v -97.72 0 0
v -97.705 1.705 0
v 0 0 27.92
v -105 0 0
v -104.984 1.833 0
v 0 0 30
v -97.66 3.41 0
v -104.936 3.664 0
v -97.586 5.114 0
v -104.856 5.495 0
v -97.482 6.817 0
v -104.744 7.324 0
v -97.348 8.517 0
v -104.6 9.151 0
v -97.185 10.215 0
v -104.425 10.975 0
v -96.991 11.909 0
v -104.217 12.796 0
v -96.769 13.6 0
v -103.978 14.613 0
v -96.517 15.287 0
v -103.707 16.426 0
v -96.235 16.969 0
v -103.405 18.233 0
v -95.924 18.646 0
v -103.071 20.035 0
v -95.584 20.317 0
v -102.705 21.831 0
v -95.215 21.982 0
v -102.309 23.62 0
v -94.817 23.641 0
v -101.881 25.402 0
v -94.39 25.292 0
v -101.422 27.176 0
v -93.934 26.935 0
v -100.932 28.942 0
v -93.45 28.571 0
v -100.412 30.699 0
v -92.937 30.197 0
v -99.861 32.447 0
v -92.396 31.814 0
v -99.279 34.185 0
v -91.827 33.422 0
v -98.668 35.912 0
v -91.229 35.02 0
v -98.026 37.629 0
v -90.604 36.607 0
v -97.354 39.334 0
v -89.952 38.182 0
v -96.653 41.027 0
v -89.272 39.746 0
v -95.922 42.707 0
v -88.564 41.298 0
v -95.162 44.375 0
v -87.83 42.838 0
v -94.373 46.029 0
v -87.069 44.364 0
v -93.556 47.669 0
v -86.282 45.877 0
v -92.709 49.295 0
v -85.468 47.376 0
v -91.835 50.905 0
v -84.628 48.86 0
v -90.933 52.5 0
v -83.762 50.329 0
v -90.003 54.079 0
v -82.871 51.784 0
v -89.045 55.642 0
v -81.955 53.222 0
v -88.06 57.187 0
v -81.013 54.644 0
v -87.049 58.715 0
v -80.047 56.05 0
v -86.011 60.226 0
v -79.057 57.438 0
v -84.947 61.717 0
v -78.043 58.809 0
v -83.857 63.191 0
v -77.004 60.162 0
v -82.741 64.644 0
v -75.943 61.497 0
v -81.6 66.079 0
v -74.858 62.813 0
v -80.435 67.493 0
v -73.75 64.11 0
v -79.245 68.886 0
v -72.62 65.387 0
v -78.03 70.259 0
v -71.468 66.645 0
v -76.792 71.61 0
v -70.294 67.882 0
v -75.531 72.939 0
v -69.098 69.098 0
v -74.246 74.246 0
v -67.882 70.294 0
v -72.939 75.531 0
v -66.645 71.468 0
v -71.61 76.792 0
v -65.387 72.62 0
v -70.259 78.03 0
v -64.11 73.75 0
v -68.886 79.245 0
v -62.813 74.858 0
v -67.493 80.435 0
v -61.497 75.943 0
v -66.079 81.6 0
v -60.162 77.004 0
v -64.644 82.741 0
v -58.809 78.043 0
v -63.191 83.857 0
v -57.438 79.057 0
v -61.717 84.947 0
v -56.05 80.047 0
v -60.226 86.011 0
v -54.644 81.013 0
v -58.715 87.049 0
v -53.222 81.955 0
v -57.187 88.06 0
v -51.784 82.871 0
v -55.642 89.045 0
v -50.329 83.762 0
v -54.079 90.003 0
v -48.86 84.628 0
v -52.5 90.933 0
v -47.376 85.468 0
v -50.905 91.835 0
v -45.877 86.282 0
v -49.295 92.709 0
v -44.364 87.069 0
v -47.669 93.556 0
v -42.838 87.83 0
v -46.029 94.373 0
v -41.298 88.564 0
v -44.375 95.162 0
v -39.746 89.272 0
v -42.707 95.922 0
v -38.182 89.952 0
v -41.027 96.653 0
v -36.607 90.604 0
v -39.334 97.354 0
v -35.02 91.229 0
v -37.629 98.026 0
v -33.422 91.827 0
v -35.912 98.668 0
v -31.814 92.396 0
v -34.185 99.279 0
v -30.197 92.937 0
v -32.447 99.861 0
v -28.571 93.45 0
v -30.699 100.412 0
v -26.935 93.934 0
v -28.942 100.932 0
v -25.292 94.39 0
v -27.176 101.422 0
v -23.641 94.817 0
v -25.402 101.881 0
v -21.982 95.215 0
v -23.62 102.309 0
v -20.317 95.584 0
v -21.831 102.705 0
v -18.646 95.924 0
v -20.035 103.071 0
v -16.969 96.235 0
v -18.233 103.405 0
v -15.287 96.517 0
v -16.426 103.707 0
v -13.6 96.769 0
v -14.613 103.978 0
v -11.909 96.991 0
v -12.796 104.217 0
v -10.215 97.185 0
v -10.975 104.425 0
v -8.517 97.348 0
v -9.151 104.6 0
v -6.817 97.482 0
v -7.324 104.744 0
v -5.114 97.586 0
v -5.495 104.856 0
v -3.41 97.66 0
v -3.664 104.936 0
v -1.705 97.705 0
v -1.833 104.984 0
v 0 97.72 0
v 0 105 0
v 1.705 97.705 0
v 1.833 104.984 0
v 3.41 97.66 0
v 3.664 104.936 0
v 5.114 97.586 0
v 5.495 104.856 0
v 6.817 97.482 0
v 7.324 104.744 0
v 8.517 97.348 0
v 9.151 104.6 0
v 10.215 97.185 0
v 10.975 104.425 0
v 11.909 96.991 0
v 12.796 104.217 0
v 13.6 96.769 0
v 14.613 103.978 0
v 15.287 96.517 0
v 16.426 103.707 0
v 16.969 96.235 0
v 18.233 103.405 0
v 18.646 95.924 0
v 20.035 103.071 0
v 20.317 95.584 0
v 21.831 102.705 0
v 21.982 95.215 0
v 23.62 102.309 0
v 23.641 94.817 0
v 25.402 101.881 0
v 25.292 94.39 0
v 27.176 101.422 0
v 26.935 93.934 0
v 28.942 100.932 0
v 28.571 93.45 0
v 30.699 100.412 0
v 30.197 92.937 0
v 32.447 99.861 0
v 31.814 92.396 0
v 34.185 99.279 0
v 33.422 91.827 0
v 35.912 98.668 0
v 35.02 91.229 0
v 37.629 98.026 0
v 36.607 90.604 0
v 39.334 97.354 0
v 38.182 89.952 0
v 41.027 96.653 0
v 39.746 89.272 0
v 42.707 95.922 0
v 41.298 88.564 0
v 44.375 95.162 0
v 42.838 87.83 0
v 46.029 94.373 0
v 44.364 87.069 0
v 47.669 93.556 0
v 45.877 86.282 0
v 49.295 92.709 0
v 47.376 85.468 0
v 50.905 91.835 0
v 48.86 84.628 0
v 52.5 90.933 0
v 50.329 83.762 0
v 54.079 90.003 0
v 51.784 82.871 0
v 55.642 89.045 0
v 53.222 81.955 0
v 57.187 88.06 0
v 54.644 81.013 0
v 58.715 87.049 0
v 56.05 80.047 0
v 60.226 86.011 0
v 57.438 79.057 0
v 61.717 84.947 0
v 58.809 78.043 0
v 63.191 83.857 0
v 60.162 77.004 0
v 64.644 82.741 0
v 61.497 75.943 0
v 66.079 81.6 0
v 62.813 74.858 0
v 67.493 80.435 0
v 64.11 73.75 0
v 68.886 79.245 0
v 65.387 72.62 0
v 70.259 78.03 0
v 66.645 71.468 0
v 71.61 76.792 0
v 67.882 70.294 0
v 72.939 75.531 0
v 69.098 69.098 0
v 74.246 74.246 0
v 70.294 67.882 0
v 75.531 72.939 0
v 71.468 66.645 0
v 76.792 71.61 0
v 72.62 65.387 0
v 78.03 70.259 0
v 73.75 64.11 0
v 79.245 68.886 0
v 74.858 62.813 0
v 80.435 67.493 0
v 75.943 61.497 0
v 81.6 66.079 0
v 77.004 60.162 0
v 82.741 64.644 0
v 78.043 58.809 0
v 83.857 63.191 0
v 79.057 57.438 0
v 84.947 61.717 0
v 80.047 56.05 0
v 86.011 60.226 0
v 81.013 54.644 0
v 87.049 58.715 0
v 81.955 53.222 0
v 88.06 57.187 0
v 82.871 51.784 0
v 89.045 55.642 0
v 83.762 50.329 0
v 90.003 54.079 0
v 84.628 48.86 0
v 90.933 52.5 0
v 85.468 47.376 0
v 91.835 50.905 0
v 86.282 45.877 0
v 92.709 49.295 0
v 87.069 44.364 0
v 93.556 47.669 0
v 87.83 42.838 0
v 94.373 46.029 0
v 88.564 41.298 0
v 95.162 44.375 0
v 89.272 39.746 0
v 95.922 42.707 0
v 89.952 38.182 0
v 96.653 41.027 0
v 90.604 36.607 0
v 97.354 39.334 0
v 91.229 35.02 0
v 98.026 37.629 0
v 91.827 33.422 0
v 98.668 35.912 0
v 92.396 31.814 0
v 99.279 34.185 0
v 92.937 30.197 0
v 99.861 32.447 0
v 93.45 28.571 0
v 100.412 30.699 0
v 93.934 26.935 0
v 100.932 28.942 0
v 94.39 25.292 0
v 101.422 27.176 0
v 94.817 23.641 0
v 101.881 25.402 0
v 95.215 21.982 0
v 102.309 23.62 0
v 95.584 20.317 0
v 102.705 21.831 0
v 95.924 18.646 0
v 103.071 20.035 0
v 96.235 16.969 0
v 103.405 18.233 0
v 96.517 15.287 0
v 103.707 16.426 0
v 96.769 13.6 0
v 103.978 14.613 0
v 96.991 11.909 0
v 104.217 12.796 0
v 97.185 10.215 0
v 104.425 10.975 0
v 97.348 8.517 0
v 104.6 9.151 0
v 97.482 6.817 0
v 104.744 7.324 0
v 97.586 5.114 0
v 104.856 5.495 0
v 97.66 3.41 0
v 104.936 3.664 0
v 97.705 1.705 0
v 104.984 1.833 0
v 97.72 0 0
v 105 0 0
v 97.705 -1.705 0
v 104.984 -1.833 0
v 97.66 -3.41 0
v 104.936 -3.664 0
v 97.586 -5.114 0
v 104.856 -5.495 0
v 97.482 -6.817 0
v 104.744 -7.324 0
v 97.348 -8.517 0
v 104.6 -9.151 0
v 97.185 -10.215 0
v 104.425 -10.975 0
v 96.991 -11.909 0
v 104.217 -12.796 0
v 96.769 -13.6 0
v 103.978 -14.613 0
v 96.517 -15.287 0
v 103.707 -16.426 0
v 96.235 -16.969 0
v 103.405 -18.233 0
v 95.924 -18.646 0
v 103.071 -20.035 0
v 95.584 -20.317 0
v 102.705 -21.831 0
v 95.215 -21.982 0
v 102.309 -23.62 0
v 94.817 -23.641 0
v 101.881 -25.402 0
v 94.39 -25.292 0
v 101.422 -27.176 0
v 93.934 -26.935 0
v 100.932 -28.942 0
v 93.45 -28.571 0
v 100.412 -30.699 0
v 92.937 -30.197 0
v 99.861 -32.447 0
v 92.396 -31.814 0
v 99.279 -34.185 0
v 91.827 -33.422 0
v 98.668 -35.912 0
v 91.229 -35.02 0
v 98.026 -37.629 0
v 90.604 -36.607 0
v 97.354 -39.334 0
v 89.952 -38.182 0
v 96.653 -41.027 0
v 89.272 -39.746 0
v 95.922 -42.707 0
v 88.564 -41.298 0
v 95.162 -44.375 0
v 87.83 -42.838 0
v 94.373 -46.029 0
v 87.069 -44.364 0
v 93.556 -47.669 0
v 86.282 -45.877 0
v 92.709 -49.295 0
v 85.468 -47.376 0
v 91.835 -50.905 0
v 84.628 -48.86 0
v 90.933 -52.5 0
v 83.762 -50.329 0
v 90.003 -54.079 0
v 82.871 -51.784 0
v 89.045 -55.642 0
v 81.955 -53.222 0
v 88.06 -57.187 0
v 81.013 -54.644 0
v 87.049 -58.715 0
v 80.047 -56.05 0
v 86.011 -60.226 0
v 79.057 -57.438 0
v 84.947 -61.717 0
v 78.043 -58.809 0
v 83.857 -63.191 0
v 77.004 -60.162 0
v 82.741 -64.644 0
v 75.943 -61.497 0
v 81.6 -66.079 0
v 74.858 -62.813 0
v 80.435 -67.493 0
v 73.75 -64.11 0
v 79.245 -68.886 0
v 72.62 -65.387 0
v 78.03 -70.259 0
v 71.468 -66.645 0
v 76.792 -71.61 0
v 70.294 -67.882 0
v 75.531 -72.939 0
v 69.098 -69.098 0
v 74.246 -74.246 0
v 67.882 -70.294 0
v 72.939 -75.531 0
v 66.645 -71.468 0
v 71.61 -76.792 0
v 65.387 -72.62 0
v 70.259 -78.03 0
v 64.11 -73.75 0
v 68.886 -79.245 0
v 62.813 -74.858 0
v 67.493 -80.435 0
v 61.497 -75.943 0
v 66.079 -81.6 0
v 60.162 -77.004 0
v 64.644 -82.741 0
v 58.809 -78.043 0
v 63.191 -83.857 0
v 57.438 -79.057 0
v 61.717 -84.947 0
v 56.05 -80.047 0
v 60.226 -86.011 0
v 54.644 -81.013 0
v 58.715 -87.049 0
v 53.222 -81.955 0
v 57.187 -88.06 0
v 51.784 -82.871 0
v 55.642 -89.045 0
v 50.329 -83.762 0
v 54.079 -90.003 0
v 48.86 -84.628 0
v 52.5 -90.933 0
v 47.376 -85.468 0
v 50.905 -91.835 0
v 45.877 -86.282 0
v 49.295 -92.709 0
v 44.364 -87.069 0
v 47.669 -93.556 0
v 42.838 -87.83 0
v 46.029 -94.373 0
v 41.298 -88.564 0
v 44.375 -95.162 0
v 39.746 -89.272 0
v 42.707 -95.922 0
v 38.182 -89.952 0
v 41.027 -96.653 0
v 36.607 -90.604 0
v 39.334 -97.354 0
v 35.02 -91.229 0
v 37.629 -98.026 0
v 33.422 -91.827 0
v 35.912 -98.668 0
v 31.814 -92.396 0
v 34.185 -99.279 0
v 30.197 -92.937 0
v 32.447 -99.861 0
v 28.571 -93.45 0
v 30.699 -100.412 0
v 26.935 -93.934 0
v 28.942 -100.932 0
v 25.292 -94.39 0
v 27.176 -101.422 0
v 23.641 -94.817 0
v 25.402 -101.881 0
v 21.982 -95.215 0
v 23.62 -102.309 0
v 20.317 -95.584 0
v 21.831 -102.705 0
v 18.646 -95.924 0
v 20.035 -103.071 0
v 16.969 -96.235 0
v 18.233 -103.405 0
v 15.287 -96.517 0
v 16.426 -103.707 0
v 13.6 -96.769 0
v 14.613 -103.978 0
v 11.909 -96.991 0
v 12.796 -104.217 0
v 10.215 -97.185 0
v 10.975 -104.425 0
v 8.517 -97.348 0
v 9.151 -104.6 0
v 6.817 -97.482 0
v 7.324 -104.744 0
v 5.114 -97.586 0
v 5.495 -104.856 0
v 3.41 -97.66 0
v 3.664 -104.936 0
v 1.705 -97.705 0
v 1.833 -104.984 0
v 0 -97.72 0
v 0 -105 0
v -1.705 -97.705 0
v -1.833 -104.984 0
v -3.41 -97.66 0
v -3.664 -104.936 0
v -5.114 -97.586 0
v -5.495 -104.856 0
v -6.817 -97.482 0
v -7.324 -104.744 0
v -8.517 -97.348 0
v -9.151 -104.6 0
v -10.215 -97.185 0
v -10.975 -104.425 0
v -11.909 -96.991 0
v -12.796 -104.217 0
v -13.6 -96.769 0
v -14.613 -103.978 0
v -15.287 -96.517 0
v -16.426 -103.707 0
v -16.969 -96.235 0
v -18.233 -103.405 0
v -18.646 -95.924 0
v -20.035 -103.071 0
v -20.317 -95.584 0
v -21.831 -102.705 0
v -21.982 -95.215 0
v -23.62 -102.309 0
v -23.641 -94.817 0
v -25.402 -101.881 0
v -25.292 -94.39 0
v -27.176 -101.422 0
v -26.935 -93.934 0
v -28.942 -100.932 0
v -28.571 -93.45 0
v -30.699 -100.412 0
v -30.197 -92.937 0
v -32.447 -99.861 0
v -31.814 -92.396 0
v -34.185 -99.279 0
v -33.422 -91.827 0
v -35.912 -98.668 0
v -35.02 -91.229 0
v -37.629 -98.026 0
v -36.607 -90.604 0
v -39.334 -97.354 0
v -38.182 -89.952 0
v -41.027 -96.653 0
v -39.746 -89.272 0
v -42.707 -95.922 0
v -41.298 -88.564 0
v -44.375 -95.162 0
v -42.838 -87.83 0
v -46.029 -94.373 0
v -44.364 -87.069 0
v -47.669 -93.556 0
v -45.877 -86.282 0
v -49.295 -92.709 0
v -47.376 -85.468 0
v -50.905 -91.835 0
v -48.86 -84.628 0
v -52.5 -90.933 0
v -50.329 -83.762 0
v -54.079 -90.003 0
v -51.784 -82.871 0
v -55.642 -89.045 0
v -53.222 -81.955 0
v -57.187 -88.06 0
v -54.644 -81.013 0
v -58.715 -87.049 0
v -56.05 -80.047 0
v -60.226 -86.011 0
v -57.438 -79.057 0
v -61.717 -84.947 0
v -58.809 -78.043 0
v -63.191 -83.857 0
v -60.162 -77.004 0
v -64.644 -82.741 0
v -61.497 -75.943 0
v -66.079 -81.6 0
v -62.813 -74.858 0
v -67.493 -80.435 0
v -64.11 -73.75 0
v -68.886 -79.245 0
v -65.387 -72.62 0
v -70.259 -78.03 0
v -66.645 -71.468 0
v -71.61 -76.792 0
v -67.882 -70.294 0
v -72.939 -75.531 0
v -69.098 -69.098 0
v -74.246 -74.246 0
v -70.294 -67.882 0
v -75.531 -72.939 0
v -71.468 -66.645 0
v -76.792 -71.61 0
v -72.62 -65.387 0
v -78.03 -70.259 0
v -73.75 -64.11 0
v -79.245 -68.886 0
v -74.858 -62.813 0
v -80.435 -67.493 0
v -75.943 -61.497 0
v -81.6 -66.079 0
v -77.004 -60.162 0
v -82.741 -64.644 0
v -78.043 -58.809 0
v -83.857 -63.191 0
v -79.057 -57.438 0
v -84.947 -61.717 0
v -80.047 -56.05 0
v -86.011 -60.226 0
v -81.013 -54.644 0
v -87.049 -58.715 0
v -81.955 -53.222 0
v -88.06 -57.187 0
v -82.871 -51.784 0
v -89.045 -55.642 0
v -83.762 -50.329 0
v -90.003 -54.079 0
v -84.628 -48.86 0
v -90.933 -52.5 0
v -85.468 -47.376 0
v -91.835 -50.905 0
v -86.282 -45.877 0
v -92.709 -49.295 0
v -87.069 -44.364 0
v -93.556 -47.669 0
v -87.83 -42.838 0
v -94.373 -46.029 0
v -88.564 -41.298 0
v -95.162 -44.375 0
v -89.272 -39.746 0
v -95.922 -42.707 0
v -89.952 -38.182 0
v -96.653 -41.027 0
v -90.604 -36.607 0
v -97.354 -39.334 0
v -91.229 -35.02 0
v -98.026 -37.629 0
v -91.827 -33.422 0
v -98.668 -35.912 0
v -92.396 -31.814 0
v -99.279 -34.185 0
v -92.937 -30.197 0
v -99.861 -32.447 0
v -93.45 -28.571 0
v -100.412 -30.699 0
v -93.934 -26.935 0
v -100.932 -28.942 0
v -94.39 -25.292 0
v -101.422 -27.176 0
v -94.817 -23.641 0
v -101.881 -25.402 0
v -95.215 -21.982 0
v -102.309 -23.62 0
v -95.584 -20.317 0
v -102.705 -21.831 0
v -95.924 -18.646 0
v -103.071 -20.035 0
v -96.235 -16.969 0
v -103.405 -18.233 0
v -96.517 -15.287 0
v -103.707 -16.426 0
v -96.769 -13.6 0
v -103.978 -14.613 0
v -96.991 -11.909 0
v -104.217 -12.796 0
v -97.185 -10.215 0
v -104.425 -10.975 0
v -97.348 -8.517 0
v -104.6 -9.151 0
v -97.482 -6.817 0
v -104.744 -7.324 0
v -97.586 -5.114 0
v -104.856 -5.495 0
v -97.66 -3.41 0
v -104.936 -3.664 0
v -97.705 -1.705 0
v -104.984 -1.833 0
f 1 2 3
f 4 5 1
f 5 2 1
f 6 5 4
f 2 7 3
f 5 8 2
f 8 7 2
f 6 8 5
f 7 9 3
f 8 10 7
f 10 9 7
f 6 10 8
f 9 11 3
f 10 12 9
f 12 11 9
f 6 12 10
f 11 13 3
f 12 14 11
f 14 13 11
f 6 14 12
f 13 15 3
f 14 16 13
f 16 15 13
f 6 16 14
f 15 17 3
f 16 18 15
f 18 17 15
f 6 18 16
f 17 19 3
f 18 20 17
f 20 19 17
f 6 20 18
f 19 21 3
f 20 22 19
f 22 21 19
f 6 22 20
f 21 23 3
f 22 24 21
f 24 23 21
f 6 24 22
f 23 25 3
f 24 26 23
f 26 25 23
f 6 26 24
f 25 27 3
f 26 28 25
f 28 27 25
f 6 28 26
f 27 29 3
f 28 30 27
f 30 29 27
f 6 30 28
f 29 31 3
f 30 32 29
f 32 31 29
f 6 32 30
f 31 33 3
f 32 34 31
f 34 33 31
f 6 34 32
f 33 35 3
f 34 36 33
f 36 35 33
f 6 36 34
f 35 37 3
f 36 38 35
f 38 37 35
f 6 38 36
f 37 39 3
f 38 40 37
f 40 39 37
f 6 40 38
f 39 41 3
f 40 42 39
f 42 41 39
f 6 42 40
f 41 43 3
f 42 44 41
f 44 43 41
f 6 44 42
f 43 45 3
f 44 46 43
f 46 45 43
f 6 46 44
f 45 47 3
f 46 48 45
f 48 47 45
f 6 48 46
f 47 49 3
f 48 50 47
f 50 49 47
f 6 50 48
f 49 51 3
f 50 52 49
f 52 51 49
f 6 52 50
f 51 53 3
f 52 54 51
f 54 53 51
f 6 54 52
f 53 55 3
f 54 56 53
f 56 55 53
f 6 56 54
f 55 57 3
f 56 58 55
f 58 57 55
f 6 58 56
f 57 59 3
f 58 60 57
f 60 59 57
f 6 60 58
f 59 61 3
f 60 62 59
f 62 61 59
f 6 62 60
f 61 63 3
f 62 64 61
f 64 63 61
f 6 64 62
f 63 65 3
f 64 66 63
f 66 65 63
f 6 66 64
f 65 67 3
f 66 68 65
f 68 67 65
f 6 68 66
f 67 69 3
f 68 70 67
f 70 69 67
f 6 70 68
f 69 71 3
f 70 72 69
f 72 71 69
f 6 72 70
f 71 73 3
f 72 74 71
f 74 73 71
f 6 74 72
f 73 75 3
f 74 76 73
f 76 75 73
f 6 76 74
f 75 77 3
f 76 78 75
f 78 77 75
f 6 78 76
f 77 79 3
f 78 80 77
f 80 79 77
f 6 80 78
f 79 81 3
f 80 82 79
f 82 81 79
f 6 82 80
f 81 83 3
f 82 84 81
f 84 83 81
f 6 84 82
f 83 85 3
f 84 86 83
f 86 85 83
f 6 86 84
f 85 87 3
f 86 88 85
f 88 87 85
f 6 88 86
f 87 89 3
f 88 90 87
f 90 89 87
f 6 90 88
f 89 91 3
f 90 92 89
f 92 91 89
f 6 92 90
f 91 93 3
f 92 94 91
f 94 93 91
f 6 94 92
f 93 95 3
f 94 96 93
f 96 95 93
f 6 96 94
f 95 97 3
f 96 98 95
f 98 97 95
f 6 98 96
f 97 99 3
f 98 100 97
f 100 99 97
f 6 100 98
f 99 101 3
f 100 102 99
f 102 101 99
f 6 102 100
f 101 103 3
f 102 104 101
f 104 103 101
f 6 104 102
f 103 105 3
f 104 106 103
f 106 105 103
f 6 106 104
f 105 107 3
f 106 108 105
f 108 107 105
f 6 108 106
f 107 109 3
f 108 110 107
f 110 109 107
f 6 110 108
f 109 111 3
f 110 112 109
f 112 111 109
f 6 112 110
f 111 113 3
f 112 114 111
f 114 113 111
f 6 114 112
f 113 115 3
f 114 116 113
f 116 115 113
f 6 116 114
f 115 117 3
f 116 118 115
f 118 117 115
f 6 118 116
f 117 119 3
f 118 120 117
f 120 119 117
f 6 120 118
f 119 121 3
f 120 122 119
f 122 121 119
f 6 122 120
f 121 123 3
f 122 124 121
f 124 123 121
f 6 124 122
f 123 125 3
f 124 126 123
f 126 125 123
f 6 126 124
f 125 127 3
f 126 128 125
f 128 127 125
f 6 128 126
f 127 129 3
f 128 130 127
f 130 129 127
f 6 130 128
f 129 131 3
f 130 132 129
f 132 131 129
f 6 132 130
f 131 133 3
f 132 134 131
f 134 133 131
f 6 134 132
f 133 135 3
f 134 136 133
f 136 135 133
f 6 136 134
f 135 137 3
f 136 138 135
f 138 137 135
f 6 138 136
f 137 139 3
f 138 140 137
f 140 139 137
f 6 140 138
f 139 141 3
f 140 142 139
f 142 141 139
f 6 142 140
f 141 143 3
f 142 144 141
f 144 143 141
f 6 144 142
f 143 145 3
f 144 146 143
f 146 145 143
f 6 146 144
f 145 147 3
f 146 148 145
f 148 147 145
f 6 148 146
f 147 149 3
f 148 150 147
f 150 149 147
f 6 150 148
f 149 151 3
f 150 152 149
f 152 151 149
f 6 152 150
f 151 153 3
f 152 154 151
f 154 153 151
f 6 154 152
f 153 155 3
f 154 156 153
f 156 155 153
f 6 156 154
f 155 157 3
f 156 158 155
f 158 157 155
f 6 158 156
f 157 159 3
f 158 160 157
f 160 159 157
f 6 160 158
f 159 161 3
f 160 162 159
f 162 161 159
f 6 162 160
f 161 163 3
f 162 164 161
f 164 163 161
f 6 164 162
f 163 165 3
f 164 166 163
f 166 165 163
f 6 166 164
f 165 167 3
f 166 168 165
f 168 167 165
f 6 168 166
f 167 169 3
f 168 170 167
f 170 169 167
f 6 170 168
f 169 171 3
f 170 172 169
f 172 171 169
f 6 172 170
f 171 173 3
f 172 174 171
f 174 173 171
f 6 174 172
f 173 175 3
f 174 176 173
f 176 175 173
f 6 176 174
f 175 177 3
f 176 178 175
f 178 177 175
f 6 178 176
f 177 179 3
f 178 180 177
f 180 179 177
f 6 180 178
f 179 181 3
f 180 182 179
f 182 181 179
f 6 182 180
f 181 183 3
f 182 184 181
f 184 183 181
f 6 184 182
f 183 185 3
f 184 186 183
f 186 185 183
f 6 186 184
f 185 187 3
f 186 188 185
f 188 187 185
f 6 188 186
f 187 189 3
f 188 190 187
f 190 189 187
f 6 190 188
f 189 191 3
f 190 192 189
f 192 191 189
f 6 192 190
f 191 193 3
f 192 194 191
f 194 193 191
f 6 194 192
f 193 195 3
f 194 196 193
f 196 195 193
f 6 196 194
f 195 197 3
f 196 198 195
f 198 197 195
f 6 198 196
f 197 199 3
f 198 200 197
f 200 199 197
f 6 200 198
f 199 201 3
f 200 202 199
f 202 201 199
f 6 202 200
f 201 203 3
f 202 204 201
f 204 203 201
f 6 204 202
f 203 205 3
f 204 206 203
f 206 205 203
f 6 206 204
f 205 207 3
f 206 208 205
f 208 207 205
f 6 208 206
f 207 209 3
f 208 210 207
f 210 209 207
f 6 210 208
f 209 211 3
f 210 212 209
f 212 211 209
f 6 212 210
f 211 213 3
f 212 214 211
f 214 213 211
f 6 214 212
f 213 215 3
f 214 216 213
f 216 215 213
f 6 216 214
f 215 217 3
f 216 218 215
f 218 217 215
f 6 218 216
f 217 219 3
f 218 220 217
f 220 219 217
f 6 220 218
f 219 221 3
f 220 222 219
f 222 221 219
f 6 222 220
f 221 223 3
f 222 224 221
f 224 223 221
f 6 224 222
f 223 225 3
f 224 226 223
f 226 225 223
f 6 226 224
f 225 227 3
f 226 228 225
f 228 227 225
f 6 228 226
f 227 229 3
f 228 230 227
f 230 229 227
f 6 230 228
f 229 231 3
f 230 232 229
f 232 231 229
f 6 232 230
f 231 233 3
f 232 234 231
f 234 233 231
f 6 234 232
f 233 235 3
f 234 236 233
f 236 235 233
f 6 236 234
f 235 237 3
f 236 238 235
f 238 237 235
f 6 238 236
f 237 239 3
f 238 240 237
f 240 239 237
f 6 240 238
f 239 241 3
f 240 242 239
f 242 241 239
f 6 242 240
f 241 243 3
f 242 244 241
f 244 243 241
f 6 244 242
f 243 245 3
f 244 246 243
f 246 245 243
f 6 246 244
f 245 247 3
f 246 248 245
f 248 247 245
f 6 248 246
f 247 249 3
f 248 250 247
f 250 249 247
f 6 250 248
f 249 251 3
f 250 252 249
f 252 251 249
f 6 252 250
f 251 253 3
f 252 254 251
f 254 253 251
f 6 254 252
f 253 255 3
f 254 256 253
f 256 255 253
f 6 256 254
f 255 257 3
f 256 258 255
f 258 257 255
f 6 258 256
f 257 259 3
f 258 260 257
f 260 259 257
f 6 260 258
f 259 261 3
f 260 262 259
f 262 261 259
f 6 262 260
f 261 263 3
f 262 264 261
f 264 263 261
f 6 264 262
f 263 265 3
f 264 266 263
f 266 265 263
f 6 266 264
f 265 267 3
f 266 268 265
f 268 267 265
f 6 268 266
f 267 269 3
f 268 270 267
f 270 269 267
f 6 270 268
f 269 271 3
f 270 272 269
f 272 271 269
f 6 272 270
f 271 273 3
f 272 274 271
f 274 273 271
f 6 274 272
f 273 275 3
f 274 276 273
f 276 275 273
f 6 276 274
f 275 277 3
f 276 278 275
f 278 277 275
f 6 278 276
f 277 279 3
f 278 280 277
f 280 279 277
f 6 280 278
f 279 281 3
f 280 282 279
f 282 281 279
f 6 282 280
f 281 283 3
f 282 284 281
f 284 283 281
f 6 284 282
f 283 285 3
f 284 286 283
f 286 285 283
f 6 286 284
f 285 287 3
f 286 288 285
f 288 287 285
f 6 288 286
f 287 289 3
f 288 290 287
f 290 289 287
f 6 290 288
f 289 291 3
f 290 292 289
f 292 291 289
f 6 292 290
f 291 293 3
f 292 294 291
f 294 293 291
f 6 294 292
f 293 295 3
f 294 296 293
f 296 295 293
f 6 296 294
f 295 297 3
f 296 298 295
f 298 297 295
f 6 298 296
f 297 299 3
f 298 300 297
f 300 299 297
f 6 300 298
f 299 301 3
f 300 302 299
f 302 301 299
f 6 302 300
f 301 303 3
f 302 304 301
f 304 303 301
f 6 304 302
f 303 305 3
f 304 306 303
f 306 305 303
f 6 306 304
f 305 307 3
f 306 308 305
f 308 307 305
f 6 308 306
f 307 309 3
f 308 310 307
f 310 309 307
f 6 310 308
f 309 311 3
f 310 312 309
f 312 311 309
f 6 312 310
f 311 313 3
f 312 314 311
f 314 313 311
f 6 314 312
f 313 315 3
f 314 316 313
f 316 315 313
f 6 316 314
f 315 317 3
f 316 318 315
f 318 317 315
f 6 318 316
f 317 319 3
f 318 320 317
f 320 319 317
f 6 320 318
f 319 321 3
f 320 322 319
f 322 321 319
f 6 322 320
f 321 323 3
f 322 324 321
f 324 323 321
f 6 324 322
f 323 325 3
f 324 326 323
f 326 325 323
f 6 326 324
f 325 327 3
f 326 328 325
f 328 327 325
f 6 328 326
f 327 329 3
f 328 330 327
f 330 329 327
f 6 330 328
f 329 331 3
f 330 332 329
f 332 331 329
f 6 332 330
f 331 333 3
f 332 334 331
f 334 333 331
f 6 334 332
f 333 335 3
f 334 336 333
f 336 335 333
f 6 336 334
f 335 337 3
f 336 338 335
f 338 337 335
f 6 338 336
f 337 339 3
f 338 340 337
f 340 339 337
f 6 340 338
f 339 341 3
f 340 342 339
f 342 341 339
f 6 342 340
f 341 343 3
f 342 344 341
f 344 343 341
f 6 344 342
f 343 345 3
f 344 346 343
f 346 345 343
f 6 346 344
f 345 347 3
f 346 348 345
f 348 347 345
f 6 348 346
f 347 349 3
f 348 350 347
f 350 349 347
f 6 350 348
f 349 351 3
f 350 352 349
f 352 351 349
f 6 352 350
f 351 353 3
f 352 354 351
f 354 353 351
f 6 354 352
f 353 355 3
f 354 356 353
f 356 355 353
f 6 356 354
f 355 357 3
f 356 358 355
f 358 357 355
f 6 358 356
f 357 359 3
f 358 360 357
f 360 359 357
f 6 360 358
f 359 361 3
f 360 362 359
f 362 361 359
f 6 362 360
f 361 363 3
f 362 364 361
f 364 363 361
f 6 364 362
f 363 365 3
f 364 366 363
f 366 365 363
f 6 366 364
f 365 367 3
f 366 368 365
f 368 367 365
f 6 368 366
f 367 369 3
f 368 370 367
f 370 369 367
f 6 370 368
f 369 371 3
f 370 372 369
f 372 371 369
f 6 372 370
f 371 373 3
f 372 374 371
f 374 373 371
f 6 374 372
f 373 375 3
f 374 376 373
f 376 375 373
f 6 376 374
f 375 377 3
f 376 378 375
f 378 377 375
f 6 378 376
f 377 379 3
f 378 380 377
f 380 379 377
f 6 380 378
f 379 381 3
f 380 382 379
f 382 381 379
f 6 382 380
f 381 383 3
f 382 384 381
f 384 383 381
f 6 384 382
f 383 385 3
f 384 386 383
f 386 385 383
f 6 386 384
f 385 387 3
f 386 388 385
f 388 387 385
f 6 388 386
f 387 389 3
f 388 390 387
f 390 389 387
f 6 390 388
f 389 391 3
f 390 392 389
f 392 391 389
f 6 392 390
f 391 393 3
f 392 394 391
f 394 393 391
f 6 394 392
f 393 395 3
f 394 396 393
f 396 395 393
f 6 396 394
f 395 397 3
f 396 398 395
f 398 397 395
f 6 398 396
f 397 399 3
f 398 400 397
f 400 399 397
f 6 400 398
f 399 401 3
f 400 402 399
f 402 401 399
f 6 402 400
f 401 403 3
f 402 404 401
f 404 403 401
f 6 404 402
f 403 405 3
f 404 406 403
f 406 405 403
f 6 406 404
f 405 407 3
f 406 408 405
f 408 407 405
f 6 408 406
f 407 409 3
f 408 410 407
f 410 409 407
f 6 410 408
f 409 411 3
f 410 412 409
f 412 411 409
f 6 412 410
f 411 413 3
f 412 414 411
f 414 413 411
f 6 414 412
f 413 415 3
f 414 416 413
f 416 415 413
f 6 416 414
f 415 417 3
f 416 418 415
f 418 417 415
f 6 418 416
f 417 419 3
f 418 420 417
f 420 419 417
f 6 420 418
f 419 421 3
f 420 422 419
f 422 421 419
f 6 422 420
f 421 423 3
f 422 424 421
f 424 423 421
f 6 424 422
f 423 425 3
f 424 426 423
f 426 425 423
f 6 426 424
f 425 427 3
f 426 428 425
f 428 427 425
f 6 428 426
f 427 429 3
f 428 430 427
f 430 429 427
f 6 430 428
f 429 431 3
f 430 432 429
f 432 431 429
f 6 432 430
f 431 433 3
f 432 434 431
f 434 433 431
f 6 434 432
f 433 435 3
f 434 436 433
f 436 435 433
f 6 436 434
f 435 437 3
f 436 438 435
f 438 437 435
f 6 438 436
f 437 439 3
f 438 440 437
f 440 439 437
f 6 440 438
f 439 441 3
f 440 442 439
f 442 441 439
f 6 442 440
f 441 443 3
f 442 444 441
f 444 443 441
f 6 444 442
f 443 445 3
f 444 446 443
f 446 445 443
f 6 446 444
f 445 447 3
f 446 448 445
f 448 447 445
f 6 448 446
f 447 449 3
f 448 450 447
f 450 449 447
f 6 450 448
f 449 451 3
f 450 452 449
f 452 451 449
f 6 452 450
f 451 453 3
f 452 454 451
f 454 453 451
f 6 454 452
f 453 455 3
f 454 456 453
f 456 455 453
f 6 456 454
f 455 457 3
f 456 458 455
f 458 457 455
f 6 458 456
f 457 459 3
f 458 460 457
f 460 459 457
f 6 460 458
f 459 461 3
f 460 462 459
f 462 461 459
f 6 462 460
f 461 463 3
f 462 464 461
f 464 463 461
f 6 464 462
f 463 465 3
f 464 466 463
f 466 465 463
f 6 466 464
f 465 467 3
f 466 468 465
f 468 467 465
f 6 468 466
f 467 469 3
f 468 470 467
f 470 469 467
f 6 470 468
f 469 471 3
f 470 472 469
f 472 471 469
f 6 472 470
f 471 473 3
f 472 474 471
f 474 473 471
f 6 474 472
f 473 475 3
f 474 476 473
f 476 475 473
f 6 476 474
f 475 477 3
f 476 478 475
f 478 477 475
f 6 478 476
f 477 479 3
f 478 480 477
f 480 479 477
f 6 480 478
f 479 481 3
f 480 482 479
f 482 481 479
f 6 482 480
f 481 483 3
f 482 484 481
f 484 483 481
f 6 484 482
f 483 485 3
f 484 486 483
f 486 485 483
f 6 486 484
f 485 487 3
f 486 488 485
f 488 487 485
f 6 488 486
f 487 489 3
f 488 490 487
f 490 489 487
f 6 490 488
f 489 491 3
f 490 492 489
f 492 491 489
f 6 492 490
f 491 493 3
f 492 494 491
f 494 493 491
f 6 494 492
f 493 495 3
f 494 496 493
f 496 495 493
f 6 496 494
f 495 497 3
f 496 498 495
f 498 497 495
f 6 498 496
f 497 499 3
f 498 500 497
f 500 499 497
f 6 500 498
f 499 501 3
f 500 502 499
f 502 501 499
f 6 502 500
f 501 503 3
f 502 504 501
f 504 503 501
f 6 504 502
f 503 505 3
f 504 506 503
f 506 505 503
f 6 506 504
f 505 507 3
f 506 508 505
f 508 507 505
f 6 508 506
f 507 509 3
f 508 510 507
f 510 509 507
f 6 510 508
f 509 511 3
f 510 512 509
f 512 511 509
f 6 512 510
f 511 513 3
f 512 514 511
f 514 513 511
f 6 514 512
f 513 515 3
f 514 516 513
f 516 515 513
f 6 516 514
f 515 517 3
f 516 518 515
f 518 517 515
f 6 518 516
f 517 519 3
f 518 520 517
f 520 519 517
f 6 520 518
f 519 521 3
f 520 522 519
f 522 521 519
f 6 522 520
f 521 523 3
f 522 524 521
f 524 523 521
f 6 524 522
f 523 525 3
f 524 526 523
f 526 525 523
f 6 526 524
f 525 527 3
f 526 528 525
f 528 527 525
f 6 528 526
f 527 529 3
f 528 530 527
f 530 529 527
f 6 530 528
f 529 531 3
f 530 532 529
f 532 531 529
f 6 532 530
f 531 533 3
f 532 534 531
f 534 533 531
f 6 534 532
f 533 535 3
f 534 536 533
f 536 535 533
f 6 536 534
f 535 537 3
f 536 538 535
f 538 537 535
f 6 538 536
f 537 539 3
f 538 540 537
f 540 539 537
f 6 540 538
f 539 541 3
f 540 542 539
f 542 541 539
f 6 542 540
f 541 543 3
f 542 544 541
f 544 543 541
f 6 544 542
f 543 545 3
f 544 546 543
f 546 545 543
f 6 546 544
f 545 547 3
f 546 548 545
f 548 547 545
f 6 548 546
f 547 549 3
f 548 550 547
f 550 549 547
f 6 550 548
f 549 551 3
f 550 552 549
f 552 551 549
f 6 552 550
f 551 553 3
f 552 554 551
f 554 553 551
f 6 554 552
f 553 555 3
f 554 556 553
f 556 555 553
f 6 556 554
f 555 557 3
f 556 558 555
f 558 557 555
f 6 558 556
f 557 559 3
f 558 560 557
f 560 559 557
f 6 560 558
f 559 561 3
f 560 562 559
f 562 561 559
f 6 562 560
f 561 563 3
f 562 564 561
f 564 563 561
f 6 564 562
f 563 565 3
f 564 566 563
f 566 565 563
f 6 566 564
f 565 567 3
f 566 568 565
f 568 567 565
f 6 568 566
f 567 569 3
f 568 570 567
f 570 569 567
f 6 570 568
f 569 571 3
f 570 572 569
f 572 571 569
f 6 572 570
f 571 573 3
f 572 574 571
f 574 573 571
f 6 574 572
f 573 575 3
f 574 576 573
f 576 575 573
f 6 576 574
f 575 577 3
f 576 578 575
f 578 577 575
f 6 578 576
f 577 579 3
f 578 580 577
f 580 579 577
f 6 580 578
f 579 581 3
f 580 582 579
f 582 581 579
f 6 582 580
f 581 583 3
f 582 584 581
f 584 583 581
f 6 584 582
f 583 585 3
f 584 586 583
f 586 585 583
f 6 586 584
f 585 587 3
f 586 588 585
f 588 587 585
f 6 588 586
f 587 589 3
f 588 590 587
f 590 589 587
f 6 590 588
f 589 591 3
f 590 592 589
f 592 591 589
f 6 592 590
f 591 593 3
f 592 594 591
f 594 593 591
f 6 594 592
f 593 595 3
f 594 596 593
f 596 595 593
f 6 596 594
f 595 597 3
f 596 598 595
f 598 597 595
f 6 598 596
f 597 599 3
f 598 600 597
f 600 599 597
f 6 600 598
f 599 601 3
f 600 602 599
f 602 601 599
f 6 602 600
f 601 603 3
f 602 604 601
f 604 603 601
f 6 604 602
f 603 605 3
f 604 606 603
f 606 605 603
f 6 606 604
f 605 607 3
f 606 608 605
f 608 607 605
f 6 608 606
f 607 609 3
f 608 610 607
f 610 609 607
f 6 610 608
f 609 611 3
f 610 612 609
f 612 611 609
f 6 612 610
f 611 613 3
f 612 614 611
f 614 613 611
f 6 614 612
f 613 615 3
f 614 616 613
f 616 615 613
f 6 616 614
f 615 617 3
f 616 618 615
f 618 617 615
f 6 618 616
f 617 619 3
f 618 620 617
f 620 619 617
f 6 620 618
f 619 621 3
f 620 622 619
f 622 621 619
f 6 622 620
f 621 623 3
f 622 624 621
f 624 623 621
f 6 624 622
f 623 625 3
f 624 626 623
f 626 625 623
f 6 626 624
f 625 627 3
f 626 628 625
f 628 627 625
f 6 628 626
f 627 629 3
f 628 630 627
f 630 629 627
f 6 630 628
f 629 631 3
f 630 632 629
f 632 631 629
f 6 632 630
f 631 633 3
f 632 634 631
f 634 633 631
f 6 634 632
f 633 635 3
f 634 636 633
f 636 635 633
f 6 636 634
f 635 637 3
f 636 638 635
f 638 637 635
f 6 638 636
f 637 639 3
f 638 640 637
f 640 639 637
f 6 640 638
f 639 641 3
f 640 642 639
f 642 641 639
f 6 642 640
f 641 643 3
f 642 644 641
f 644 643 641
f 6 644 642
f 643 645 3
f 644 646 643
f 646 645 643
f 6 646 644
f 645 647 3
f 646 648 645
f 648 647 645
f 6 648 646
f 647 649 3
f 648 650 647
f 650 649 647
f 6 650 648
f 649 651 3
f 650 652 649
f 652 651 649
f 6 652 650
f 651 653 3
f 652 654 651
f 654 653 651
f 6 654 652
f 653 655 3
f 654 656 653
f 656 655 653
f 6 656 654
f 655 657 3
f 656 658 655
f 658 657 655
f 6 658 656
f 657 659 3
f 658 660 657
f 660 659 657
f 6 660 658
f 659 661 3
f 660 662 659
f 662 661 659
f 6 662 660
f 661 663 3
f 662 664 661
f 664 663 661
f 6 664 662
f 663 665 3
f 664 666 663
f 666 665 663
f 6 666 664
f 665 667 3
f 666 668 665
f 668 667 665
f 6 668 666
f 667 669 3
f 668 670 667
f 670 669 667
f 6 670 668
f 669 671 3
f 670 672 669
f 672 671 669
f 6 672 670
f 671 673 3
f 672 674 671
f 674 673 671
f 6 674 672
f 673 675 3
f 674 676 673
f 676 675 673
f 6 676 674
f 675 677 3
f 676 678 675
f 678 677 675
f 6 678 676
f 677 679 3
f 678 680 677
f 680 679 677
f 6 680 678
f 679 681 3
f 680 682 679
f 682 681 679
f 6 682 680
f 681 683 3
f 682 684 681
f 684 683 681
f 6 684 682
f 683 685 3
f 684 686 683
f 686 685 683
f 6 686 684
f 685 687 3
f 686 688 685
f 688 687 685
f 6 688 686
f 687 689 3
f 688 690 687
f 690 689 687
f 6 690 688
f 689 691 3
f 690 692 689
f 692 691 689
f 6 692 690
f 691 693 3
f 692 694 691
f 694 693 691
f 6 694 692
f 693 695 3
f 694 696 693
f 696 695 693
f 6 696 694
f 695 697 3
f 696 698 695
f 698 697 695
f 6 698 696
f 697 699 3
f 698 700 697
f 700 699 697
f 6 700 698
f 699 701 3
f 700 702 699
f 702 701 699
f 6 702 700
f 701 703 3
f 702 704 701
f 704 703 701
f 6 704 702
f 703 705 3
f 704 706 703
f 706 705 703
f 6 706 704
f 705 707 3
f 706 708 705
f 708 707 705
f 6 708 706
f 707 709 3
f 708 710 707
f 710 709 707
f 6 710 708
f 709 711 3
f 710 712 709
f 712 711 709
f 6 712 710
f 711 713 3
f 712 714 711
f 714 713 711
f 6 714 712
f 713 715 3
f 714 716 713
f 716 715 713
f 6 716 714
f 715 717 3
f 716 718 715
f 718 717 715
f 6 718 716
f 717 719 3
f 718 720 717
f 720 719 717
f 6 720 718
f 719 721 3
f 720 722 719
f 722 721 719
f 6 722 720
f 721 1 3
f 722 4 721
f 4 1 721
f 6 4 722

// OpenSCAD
// 三角帽子（底面が開いた円すい）。単位: mm。
// diameter は裾の外径、height は底面から頂点までの外形高さ。
// thickness は斜面に垂直な肉厚。
diameter = 210;
height = 30;
thickness = 2;
$fn = 360;

module conical_hat(diameter, height, thickness) {
    assert(diameter > 0 && height > 0 && thickness > 0);
    radius = diameter / 2;
    slope = height / radius;
    // 外面 z = height - slope*r を法線方向に thickness だけ内側へ移す。
    inner_height = height - thickness * sqrt(1 + slope * slope);
    inner_radius = inner_height / slope;
    assert(inner_height > 0, "Thickness is too large for this cone.");

    rotate_extrude(convexity = 10)
        polygon(points = [
            [radius, 0],
            [0, height],
            [0, inner_height],
            [inner_radius, 0]
        ]);
}

conical_hat(diameter, height, thickness);
